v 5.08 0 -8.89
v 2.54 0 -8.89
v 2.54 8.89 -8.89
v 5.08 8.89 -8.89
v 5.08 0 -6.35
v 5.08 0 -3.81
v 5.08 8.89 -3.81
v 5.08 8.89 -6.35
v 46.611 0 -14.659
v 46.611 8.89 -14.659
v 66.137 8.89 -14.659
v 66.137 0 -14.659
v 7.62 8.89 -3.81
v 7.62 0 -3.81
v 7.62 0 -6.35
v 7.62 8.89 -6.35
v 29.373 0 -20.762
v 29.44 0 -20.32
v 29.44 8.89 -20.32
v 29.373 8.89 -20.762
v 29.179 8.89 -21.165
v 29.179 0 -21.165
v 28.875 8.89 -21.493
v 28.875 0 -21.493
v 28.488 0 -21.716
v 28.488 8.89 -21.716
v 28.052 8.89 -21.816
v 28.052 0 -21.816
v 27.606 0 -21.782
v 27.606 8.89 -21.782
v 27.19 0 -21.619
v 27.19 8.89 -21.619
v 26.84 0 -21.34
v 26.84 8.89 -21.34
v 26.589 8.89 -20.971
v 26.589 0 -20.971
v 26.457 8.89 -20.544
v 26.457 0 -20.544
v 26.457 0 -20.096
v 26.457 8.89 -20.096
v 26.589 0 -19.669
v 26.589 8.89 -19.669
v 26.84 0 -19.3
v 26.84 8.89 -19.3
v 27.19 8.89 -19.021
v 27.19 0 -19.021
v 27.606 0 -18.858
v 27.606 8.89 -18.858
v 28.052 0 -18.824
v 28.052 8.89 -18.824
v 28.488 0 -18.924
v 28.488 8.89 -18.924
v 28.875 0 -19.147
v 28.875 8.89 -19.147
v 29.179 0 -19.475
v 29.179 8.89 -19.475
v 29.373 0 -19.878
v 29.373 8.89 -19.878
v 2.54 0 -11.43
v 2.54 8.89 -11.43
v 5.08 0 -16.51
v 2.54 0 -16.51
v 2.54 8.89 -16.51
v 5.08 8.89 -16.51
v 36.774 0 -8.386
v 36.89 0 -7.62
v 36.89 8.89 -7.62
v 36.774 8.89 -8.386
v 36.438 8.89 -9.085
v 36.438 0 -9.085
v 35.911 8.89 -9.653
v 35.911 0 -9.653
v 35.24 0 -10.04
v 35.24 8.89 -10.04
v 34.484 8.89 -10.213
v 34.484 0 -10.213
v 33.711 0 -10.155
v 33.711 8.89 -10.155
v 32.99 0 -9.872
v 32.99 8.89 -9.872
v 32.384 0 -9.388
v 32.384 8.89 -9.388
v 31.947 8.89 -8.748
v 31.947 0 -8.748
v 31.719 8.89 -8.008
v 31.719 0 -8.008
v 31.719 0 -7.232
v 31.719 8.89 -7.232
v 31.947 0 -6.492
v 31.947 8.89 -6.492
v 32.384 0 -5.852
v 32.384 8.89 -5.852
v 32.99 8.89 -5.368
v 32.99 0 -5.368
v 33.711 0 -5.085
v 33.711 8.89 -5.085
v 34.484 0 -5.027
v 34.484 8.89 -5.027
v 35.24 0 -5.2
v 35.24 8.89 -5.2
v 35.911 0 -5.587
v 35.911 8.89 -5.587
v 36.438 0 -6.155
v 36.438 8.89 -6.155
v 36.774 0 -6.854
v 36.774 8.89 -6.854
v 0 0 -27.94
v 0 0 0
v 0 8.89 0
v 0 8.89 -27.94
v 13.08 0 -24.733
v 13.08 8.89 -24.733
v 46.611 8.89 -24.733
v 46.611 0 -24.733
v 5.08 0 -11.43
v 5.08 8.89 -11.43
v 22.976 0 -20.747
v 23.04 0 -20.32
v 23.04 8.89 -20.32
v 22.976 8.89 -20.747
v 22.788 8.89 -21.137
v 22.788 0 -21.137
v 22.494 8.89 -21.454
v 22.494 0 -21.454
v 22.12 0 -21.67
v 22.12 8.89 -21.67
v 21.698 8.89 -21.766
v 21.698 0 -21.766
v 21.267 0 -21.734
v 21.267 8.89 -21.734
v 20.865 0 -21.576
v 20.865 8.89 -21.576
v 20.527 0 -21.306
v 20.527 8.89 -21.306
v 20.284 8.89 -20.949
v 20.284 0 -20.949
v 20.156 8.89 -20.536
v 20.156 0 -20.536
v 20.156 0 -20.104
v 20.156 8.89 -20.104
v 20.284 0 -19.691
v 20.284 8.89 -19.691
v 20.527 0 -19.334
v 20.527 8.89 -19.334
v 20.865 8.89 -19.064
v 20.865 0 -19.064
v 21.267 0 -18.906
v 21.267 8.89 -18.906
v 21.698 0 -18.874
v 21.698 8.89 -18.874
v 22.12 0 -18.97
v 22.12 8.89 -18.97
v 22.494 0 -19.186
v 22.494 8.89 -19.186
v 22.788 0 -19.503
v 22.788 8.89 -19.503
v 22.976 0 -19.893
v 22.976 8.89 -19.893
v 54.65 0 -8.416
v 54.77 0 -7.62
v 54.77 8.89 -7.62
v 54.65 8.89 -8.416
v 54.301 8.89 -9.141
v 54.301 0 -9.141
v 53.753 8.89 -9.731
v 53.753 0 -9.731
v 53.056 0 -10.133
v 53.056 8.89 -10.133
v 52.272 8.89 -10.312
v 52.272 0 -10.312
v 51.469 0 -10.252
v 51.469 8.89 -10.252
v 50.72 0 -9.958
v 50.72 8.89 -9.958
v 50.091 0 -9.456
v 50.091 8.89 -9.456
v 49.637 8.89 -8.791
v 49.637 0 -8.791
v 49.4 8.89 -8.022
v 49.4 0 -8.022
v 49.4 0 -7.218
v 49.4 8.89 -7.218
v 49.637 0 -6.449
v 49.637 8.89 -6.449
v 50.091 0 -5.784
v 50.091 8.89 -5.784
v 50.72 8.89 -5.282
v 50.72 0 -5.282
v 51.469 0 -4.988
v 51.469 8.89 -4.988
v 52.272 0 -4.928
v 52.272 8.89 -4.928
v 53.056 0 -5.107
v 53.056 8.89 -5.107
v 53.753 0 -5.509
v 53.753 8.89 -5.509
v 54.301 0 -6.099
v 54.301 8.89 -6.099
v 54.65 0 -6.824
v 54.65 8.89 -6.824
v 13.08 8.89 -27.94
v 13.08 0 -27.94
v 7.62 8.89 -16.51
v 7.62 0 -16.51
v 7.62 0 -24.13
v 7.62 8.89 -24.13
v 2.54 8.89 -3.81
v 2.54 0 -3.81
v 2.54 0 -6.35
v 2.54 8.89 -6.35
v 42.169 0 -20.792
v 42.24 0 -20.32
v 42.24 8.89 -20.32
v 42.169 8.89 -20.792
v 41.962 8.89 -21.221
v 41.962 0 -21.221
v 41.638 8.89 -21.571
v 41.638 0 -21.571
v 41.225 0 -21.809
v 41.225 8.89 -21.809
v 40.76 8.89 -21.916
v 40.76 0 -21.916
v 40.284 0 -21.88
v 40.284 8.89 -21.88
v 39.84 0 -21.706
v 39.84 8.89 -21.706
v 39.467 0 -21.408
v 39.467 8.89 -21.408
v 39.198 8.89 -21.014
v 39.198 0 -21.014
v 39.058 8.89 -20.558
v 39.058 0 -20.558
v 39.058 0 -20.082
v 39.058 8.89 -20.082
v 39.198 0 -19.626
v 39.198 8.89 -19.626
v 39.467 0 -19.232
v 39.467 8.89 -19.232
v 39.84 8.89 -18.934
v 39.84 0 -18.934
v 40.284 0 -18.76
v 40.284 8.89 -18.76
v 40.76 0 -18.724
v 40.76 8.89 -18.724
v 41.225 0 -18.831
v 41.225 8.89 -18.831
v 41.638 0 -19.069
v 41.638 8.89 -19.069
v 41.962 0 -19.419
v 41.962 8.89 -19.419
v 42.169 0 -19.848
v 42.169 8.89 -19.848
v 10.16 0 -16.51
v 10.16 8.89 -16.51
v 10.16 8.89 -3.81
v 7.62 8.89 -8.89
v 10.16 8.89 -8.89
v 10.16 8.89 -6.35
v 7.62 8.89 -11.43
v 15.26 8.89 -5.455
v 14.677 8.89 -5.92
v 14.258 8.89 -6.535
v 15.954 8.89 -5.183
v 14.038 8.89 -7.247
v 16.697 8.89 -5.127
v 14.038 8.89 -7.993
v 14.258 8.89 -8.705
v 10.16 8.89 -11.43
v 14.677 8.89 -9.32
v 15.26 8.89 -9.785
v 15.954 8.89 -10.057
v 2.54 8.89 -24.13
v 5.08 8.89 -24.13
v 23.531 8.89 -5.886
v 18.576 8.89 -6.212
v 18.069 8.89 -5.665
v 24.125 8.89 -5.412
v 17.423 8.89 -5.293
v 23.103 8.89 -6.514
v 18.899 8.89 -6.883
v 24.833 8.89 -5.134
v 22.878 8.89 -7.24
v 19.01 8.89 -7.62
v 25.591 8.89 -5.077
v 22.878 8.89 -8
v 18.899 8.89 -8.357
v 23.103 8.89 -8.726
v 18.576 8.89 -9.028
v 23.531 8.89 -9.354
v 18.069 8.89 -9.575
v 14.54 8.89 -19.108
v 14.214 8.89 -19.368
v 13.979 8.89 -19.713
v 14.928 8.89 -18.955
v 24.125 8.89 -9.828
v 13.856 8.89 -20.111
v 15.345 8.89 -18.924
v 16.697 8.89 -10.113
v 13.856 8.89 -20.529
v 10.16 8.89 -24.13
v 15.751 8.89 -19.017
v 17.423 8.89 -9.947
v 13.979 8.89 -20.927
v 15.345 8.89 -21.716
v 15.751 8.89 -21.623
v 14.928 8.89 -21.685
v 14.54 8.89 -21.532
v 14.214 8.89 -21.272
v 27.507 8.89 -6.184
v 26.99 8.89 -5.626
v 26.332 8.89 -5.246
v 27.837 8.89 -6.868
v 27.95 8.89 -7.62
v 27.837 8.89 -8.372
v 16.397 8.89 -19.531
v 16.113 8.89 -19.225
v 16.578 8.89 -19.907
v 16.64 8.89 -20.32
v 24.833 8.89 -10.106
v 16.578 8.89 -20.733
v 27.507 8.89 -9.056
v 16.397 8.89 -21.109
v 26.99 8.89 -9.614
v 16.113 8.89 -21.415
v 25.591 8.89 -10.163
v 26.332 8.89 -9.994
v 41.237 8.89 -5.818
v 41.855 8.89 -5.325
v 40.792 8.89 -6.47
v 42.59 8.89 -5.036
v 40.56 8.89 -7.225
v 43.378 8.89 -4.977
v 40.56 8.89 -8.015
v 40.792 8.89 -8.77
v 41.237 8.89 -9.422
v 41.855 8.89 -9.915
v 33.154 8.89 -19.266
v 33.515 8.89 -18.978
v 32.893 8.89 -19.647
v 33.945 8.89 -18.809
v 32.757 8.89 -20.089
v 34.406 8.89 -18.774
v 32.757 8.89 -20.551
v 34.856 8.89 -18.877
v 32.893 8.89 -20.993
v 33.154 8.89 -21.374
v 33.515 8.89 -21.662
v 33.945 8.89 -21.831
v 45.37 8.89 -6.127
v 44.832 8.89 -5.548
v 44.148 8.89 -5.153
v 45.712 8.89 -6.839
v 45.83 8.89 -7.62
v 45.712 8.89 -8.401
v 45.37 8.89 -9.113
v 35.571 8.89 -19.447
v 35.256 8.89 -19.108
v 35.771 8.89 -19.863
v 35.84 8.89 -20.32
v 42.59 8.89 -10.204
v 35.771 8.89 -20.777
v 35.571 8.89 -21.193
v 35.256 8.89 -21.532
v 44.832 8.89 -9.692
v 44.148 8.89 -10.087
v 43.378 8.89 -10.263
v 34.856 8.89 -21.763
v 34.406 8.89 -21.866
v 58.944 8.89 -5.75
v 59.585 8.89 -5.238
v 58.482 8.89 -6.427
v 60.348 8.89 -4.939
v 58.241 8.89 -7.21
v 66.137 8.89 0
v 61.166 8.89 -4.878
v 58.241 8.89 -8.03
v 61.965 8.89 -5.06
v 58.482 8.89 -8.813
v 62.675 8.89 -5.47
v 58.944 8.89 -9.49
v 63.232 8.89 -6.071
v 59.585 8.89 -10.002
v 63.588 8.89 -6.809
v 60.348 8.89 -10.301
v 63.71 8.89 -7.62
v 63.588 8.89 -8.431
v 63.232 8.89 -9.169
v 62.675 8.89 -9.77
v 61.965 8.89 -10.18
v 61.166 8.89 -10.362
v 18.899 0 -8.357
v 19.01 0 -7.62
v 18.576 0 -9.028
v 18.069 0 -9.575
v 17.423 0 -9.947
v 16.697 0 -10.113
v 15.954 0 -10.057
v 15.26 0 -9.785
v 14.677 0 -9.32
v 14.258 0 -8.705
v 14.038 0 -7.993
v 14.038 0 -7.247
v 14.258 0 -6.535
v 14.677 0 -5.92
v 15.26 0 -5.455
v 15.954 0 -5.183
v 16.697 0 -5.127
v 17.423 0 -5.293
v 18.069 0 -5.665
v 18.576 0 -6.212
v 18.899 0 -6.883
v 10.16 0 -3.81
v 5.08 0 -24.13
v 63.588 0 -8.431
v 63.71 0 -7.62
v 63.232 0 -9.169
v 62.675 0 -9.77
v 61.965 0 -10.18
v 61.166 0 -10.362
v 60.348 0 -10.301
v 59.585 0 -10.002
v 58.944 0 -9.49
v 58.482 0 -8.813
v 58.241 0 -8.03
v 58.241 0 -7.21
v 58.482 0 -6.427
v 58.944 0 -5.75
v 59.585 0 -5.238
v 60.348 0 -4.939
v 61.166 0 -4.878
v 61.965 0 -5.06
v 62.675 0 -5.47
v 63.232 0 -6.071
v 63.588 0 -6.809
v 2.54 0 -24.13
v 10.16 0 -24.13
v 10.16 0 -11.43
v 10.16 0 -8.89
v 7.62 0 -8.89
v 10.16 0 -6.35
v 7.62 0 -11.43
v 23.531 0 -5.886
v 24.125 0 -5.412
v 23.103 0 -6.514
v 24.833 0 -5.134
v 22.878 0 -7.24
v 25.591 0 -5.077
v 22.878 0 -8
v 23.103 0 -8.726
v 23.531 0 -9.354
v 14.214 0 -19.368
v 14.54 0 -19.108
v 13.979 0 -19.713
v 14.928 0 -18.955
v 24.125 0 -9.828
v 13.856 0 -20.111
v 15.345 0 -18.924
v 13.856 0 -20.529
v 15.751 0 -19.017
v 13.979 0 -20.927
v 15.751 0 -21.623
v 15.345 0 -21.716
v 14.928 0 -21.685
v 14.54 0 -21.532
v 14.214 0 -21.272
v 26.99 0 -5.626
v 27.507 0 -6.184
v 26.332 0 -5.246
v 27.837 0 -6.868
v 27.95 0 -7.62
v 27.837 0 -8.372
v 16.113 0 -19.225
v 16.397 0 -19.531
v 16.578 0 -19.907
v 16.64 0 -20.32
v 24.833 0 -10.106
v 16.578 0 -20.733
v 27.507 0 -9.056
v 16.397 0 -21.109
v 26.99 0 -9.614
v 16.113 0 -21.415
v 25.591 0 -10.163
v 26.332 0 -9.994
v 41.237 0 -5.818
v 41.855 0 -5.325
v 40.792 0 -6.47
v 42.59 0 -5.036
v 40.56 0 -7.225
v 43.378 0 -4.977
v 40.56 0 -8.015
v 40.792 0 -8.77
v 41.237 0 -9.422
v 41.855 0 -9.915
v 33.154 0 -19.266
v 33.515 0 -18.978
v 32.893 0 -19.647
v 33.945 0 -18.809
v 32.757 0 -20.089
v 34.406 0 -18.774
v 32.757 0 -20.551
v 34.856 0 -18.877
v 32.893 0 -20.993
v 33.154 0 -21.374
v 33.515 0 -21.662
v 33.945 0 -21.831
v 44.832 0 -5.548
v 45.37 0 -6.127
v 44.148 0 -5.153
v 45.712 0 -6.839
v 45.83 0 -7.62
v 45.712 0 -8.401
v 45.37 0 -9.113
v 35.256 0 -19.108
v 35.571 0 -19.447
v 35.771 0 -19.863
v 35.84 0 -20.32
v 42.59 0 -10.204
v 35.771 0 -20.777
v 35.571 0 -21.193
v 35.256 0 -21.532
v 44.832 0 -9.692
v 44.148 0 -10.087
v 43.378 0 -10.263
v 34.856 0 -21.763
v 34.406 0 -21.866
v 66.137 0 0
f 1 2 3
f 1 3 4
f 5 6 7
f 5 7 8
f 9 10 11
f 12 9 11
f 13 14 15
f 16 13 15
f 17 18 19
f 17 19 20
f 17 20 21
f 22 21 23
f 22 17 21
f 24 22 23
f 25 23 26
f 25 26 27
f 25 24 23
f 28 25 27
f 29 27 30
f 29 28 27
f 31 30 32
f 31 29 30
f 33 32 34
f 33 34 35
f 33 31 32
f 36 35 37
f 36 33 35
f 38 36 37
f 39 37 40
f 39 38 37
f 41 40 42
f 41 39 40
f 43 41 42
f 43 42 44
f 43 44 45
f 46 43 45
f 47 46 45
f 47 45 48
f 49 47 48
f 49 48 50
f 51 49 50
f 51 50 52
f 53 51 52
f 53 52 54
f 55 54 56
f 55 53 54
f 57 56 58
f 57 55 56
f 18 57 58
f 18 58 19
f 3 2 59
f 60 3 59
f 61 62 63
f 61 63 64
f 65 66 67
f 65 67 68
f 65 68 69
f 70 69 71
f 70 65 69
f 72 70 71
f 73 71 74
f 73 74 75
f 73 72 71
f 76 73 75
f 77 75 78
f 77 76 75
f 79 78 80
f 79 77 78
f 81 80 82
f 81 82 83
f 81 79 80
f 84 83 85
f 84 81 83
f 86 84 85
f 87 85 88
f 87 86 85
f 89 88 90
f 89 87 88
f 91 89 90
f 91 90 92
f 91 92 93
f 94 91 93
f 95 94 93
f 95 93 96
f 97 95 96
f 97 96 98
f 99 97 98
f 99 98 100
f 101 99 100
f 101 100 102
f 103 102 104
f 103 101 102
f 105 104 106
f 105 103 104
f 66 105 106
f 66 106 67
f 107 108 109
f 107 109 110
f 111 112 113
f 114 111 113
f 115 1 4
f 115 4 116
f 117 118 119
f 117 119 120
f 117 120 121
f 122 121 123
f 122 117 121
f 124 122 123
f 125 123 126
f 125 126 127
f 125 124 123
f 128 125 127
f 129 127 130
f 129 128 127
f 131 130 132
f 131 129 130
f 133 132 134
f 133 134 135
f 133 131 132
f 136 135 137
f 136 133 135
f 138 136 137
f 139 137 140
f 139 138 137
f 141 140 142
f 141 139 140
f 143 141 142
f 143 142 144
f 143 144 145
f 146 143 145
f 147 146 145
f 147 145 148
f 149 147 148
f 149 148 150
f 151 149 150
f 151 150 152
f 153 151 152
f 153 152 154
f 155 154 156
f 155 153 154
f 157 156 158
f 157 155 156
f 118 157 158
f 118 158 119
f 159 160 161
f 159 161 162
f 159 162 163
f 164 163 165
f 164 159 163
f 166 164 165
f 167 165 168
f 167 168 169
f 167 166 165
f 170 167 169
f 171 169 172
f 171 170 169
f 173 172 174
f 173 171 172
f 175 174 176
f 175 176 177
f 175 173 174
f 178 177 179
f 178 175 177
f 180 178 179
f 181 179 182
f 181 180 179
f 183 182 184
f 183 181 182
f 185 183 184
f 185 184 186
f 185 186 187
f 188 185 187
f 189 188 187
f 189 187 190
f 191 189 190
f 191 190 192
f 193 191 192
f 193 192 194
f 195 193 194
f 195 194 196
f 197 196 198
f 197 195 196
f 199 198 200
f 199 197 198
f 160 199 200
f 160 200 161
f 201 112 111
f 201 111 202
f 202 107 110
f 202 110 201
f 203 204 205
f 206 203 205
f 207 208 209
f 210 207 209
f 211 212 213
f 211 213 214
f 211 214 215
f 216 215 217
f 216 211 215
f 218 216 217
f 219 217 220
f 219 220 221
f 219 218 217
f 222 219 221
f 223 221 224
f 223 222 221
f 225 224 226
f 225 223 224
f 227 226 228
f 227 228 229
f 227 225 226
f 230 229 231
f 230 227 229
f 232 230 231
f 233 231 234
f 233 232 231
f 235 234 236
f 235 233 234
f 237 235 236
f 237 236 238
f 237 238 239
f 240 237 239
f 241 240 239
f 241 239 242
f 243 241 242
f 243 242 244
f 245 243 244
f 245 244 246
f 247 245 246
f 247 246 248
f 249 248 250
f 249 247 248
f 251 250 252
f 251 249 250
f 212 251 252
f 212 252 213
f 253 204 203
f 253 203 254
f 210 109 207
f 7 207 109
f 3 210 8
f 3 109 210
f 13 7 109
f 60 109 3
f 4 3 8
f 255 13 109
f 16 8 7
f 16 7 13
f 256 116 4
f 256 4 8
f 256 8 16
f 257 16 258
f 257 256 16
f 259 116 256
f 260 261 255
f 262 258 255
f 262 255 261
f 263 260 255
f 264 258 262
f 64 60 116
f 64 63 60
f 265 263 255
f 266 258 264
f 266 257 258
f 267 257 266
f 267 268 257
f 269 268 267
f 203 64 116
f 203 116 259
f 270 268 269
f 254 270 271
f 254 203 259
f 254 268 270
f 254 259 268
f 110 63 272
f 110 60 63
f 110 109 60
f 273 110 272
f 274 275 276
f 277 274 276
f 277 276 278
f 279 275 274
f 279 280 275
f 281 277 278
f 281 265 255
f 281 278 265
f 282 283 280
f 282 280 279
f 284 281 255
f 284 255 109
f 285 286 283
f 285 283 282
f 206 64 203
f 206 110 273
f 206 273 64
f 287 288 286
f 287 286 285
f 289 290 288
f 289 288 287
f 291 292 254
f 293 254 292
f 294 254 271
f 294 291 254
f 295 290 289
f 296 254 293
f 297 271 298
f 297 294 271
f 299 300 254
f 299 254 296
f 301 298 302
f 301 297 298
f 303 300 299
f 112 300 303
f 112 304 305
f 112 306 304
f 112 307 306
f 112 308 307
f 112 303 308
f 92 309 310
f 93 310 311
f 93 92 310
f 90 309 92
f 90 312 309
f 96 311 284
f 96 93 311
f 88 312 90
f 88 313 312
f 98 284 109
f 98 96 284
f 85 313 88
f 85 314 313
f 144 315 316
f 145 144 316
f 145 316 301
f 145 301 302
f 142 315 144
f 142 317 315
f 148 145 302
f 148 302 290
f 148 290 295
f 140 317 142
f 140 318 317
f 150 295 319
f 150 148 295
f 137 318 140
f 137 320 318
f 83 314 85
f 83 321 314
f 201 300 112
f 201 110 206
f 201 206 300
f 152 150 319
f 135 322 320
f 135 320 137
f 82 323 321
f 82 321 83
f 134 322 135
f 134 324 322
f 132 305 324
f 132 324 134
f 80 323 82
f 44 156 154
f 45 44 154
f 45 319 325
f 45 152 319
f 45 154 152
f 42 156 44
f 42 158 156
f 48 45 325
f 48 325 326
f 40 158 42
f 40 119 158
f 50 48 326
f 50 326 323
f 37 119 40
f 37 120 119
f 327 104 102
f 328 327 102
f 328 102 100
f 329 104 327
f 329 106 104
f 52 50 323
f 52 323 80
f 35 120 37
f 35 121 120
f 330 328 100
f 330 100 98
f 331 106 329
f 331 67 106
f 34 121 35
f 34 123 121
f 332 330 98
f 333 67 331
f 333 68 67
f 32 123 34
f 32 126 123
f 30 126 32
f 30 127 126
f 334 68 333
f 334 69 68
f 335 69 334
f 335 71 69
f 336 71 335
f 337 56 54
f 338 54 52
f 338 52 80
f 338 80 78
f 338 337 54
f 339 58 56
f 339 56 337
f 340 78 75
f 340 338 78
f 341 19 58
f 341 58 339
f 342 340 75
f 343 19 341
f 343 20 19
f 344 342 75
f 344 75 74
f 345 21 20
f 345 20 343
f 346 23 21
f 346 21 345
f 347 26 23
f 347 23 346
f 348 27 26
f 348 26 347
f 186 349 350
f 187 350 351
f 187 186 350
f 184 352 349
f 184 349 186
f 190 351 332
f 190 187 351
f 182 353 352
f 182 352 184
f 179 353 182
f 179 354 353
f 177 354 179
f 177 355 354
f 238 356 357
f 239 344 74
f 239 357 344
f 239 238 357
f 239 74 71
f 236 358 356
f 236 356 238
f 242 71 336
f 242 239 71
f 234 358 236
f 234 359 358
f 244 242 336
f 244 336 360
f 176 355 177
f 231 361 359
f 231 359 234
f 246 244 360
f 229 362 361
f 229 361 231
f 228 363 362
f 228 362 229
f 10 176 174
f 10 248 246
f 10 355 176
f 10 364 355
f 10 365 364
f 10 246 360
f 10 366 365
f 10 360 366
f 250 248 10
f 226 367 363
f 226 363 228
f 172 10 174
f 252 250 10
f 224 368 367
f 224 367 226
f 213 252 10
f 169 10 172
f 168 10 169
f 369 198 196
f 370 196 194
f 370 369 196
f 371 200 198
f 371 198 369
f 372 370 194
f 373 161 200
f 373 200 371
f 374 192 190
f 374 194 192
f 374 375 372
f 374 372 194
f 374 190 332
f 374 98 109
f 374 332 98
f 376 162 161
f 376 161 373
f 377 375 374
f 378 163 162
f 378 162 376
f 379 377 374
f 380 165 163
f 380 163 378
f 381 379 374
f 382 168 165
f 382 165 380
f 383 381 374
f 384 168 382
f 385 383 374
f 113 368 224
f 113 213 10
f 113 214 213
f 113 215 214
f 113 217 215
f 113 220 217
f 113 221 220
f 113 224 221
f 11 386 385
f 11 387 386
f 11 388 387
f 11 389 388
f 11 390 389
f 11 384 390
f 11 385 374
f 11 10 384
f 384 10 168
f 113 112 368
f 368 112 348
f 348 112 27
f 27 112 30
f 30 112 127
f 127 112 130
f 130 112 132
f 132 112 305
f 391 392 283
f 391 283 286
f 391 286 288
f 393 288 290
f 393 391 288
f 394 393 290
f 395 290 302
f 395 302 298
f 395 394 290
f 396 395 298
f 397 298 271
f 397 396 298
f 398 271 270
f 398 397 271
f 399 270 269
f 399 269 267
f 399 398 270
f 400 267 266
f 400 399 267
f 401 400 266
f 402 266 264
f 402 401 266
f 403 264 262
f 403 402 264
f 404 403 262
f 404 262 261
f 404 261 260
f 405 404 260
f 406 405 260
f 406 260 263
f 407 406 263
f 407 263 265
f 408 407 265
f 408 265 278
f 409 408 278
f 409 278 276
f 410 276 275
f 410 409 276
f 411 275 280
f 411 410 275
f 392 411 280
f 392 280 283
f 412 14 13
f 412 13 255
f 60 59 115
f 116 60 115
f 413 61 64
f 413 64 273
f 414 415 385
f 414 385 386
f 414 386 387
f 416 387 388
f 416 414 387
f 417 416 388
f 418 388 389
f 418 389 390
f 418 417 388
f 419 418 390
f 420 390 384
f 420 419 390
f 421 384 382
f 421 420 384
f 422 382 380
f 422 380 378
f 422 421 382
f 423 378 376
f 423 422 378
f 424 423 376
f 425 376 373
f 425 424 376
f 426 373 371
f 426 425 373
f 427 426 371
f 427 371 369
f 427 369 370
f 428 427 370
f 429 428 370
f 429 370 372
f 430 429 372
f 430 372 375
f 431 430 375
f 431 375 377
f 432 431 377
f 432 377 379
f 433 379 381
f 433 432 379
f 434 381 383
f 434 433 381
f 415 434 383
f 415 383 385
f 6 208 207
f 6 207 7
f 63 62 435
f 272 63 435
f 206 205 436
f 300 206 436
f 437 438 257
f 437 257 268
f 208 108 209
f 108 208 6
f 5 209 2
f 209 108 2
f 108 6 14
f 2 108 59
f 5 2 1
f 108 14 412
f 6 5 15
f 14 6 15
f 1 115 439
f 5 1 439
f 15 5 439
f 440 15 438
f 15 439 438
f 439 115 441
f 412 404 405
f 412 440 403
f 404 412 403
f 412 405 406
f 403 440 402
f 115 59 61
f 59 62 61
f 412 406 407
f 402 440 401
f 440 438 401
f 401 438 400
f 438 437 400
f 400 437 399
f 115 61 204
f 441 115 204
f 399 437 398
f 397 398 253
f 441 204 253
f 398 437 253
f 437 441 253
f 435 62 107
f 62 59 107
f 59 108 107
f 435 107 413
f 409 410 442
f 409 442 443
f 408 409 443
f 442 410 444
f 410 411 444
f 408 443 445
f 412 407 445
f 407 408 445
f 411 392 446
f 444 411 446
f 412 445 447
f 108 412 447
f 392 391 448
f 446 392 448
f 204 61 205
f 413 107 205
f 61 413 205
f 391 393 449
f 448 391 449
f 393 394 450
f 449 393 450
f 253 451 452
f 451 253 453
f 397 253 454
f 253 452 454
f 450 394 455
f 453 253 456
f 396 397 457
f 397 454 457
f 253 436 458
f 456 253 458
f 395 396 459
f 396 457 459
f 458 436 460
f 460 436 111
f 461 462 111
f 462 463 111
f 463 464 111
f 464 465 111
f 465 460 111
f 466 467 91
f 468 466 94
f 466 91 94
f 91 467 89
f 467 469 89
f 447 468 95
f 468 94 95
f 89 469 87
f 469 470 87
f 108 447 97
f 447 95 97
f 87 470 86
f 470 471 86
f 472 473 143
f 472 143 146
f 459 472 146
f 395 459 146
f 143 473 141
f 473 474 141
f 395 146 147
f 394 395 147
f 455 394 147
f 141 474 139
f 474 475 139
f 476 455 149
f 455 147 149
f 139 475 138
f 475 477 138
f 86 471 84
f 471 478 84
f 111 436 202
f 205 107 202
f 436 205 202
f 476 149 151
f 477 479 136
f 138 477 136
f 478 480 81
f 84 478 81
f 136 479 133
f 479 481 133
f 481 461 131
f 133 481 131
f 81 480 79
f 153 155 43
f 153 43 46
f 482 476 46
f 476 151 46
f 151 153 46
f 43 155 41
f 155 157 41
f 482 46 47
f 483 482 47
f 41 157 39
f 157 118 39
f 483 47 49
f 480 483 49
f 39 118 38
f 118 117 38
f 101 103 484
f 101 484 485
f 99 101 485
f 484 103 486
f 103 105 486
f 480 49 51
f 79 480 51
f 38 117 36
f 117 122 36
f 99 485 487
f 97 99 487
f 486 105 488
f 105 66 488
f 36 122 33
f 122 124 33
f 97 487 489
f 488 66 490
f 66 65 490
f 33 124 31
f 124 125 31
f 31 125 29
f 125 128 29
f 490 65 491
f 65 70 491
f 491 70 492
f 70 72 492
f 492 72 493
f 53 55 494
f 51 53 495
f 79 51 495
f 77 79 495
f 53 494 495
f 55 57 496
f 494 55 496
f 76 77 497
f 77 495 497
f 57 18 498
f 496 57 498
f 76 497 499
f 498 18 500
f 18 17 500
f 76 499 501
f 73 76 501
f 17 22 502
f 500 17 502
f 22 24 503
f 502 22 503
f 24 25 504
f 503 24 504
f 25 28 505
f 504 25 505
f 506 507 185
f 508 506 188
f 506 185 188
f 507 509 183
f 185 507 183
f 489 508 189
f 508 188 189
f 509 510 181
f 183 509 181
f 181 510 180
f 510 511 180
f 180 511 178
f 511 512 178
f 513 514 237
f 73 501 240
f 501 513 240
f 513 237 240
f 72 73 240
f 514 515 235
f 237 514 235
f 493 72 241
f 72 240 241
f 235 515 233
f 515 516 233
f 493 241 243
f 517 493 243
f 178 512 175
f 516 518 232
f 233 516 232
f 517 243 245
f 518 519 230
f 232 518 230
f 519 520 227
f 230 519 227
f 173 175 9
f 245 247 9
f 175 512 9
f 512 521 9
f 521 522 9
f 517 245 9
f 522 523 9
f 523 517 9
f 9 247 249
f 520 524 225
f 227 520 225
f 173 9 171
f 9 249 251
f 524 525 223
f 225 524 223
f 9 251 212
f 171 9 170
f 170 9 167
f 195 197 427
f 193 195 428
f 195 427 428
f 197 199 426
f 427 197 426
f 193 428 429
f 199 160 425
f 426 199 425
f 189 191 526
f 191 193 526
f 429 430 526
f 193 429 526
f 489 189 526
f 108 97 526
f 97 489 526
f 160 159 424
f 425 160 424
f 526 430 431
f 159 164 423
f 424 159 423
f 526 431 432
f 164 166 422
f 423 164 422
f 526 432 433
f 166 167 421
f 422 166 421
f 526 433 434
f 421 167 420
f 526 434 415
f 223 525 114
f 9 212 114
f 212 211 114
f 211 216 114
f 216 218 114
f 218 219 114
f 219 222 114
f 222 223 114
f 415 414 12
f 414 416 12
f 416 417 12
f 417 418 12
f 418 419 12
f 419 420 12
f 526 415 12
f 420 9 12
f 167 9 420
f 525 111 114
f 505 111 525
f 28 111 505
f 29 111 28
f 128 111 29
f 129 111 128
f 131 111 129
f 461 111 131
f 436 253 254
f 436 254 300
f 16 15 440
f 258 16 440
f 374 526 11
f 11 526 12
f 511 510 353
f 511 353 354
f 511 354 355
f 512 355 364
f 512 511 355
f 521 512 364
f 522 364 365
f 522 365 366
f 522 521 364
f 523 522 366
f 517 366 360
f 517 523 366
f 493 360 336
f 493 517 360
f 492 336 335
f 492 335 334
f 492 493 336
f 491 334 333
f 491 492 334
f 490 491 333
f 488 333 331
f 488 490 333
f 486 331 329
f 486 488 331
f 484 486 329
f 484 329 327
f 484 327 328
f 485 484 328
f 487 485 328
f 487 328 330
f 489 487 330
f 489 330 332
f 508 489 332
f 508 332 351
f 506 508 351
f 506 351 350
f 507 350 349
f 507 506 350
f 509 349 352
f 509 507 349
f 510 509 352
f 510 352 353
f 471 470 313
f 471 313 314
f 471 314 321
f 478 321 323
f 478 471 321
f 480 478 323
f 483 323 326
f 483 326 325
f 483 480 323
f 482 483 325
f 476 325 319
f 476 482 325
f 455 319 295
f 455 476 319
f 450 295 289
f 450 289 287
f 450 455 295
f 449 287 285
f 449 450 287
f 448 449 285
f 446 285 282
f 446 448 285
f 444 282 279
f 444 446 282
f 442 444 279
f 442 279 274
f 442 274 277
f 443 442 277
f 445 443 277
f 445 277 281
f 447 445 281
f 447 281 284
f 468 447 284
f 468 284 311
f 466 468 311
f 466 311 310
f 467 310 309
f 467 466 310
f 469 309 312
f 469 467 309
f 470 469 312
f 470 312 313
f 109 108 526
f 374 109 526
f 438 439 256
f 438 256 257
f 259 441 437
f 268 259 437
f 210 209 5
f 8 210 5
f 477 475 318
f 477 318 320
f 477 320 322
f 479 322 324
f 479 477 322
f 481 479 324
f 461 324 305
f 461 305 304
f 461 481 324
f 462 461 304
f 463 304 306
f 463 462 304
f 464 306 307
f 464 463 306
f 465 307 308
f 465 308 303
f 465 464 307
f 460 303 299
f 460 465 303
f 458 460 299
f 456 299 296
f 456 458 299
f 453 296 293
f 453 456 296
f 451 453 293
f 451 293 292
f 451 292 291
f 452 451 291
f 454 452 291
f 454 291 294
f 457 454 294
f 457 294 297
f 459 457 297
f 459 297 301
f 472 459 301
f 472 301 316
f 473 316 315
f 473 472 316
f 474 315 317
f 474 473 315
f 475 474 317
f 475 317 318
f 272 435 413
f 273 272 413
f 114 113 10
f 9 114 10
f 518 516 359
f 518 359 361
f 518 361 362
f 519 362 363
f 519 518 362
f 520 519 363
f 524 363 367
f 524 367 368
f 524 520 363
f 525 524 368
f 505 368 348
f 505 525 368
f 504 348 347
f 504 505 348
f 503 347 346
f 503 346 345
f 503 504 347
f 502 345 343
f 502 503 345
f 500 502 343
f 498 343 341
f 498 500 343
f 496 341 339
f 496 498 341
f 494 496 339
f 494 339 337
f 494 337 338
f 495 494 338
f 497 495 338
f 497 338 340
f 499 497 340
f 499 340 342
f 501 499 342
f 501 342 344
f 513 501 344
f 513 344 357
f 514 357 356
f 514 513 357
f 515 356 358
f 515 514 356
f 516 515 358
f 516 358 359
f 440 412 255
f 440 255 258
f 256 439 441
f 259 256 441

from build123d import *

# Parameters (mm, degrees)
SKETCH1_W           = 66.137036943
SKETCH1_H           = 27.94
SKETCH1_R           = 1.4
SKETCH1_R_2         = 1.45
SKETCH1_R_3         = 1.5
SKETCH1_R_4         = 1.55
SKETCH1_R_5         = 1.6
SKETCH1_R_6         = 2.5
SKETCH1_R_7         = 2.55
SKETCH1_R_8         = 2.6
SKETCH1_R_9         = 2.65
SKETCH1_R_10        = 2.7
SKETCH1_R_11        = 2.75
SKETCH1_W_2         = 2.54
SKETCH1_H_2         = 7.62
SKETCH1_H_3         = 2.54
BOSS_EXTRUDE1_DEPTH = 8.89
SKETCH2_W           = 33.530167106
SKETCH2_H           = 3.206730365
CUT_EXTRUDE1_DEPTH  = 9.89


with BuildPart() as part:
    # Sketch1 → Boss-Extrude1 (new body)
    with BuildSketch(Plane(origin=(0, 0, 0), x_dir=(1, 0, 0), z_dir=(0, 1, 0))):
        with Locations((33.068518471, 13.97)):
            Rectangle(SKETCH1_W, SKETCH1_H)
        with Locations((15.24, 20.32)):
            Circle(SKETCH1_R, mode=Mode.SUBTRACT)
        with Locations((21.59, 20.32)):
            Circle(SKETCH1_R_2, mode=Mode.SUBTRACT)
        with Locations((27.94, 20.32)):
            Circle(SKETCH1_R_3, mode=Mode.SUBTRACT)
        with Locations((34.29, 20.32)):
            Circle(SKETCH1_R_4, mode=Mode.SUBTRACT)
        with Locations((40.64, 20.32)):
            Circle(SKETCH1_R_5, mode=Mode.SUBTRACT)
        with Locations((16.51, 7.62)):
            Circle(SKETCH1_R_6, mode=Mode.SUBTRACT)
        with Locations((25.4, 7.62)):
            Circle(SKETCH1_R_7, mode=Mode.SUBTRACT)
        with Locations((34.29, 7.62)):
            Circle(SKETCH1_R_8, mode=Mode.SUBTRACT)
        with Locations((43.18, 7.62)):
            Circle(SKETCH1_R_9, mode=Mode.SUBTRACT)
        with Locations((52.07, 7.62)):
            Circle(SKETCH1_R_10, mode=Mode.SUBTRACT)
        with Locations((60.96, 7.62)):
            Circle(SKETCH1_R_11, mode=Mode.SUBTRACT)
        with Locations((3.81, 20.32)):
            Rectangle(SKETCH1_W_2, SKETCH1_H_2, mode=Mode.SUBTRACT)
        with Locations((8.89, 20.32)):
            Rectangle(SKETCH1_W_2, SKETCH1_H_2, mode=Mode.SUBTRACT)
        with Locations((3.81, 10.16)):
            Rectangle(SKETCH1_W_2, SKETCH1_H_3, mode=Mode.SUBTRACT)
        with Locations((8.89, 10.16)):
            Rectangle(SKETCH1_W_2, SKETCH1_H_3, mode=Mode.SUBTRACT)
        with Locations((3.81, 5.08)):
            Rectangle(SKETCH1_W_2, SKETCH1_H_3, mode=Mode.SUBTRACT)
        with Locations((8.89, 5.08)):
            Rectangle(SKETCH1_W_2, SKETCH1_H_3, mode=Mode.SUBTRACT)
    extrude(amount=BOSS_EXTRUDE1_DEPTH)

    # Sketch2 → Cut-Extrude1 (cut, through all)
    with BuildSketch(Plane(origin=(0, 8.89, 0), x_dir=(1, 0, 0), z_dir=(0, 1, 0))):
        with Locations((29.845478727, 26.336634818)):
            Rectangle(SKETCH2_W, SKETCH2_H)
        Polygon((66.137036943, 27.94), (46.61056228, 27.94), (46.61056228, 24.733269635), (46.61056228, 14.65880598), (66.137036943, 14.65880598), align=None)
    extrude(amount=-CUT_EXTRUDE1_DEPTH, mode=Mode.SUBTRACT)


solid = part.part
